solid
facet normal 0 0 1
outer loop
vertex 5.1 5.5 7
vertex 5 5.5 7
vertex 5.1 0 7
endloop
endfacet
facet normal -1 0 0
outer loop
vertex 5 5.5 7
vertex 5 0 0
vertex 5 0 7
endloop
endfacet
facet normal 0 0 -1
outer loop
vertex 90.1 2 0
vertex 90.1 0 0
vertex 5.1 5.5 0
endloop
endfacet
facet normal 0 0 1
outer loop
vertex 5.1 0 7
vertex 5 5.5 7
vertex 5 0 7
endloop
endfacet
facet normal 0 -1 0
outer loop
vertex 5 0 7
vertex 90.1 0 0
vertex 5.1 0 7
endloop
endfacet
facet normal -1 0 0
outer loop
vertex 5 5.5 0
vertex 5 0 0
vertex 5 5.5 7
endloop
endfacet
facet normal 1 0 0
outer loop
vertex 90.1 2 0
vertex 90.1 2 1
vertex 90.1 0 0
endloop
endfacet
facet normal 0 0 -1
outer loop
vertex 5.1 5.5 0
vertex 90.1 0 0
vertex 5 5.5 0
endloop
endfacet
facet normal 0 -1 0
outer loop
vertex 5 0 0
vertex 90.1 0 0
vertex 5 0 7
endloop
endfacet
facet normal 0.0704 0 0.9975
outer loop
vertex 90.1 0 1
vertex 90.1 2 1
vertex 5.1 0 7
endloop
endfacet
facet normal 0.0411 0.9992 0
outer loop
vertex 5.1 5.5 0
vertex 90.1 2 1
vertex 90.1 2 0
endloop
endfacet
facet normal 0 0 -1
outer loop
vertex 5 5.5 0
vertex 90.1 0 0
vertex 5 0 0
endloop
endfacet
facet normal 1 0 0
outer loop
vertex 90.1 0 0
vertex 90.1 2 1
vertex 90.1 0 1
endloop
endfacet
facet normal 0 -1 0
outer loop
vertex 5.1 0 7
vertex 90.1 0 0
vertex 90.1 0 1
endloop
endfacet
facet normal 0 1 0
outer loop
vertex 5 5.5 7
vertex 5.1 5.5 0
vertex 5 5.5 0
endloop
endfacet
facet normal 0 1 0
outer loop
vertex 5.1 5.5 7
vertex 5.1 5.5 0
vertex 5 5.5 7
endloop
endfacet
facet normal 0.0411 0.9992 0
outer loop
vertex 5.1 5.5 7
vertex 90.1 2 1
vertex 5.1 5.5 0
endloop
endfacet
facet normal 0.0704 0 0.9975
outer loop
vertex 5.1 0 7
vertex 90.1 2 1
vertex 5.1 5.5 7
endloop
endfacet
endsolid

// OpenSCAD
module fixation(){
   linear_extrude (height=1.01, $fn = 200)
    import (file="profil.dxf", layer="accroche-exterieur", $fn=500);
    translate([0,0,1])
     linear_extrude (height=3.5, $fn = 200)
    import (file="profil.dxf", layer="accroche", $fn=500);
    translate([0,0,4.499])
    linear_extrude (height=1.01, $fn = 200)
    import (file="profil.dxf", layer="accroche-exterieur", $fn=500);
   
}    
module branche_droite(){
        translate ([0,0,4])
        rotate([270,270,0])fixation(); 


        translate ([2.9999,0,0])
        linear_extrude (height=1, $fn = 200)
        import (file="profil.dxf", layer="0", $fn=500);

        hull(){
             translate ([4.9999,0,0])
             cube ([0.1,5.5,7]);
            
              translate ([90,0,0])
             cube ([0.1,2,1]);
        }
 }
 
branche_droite();
